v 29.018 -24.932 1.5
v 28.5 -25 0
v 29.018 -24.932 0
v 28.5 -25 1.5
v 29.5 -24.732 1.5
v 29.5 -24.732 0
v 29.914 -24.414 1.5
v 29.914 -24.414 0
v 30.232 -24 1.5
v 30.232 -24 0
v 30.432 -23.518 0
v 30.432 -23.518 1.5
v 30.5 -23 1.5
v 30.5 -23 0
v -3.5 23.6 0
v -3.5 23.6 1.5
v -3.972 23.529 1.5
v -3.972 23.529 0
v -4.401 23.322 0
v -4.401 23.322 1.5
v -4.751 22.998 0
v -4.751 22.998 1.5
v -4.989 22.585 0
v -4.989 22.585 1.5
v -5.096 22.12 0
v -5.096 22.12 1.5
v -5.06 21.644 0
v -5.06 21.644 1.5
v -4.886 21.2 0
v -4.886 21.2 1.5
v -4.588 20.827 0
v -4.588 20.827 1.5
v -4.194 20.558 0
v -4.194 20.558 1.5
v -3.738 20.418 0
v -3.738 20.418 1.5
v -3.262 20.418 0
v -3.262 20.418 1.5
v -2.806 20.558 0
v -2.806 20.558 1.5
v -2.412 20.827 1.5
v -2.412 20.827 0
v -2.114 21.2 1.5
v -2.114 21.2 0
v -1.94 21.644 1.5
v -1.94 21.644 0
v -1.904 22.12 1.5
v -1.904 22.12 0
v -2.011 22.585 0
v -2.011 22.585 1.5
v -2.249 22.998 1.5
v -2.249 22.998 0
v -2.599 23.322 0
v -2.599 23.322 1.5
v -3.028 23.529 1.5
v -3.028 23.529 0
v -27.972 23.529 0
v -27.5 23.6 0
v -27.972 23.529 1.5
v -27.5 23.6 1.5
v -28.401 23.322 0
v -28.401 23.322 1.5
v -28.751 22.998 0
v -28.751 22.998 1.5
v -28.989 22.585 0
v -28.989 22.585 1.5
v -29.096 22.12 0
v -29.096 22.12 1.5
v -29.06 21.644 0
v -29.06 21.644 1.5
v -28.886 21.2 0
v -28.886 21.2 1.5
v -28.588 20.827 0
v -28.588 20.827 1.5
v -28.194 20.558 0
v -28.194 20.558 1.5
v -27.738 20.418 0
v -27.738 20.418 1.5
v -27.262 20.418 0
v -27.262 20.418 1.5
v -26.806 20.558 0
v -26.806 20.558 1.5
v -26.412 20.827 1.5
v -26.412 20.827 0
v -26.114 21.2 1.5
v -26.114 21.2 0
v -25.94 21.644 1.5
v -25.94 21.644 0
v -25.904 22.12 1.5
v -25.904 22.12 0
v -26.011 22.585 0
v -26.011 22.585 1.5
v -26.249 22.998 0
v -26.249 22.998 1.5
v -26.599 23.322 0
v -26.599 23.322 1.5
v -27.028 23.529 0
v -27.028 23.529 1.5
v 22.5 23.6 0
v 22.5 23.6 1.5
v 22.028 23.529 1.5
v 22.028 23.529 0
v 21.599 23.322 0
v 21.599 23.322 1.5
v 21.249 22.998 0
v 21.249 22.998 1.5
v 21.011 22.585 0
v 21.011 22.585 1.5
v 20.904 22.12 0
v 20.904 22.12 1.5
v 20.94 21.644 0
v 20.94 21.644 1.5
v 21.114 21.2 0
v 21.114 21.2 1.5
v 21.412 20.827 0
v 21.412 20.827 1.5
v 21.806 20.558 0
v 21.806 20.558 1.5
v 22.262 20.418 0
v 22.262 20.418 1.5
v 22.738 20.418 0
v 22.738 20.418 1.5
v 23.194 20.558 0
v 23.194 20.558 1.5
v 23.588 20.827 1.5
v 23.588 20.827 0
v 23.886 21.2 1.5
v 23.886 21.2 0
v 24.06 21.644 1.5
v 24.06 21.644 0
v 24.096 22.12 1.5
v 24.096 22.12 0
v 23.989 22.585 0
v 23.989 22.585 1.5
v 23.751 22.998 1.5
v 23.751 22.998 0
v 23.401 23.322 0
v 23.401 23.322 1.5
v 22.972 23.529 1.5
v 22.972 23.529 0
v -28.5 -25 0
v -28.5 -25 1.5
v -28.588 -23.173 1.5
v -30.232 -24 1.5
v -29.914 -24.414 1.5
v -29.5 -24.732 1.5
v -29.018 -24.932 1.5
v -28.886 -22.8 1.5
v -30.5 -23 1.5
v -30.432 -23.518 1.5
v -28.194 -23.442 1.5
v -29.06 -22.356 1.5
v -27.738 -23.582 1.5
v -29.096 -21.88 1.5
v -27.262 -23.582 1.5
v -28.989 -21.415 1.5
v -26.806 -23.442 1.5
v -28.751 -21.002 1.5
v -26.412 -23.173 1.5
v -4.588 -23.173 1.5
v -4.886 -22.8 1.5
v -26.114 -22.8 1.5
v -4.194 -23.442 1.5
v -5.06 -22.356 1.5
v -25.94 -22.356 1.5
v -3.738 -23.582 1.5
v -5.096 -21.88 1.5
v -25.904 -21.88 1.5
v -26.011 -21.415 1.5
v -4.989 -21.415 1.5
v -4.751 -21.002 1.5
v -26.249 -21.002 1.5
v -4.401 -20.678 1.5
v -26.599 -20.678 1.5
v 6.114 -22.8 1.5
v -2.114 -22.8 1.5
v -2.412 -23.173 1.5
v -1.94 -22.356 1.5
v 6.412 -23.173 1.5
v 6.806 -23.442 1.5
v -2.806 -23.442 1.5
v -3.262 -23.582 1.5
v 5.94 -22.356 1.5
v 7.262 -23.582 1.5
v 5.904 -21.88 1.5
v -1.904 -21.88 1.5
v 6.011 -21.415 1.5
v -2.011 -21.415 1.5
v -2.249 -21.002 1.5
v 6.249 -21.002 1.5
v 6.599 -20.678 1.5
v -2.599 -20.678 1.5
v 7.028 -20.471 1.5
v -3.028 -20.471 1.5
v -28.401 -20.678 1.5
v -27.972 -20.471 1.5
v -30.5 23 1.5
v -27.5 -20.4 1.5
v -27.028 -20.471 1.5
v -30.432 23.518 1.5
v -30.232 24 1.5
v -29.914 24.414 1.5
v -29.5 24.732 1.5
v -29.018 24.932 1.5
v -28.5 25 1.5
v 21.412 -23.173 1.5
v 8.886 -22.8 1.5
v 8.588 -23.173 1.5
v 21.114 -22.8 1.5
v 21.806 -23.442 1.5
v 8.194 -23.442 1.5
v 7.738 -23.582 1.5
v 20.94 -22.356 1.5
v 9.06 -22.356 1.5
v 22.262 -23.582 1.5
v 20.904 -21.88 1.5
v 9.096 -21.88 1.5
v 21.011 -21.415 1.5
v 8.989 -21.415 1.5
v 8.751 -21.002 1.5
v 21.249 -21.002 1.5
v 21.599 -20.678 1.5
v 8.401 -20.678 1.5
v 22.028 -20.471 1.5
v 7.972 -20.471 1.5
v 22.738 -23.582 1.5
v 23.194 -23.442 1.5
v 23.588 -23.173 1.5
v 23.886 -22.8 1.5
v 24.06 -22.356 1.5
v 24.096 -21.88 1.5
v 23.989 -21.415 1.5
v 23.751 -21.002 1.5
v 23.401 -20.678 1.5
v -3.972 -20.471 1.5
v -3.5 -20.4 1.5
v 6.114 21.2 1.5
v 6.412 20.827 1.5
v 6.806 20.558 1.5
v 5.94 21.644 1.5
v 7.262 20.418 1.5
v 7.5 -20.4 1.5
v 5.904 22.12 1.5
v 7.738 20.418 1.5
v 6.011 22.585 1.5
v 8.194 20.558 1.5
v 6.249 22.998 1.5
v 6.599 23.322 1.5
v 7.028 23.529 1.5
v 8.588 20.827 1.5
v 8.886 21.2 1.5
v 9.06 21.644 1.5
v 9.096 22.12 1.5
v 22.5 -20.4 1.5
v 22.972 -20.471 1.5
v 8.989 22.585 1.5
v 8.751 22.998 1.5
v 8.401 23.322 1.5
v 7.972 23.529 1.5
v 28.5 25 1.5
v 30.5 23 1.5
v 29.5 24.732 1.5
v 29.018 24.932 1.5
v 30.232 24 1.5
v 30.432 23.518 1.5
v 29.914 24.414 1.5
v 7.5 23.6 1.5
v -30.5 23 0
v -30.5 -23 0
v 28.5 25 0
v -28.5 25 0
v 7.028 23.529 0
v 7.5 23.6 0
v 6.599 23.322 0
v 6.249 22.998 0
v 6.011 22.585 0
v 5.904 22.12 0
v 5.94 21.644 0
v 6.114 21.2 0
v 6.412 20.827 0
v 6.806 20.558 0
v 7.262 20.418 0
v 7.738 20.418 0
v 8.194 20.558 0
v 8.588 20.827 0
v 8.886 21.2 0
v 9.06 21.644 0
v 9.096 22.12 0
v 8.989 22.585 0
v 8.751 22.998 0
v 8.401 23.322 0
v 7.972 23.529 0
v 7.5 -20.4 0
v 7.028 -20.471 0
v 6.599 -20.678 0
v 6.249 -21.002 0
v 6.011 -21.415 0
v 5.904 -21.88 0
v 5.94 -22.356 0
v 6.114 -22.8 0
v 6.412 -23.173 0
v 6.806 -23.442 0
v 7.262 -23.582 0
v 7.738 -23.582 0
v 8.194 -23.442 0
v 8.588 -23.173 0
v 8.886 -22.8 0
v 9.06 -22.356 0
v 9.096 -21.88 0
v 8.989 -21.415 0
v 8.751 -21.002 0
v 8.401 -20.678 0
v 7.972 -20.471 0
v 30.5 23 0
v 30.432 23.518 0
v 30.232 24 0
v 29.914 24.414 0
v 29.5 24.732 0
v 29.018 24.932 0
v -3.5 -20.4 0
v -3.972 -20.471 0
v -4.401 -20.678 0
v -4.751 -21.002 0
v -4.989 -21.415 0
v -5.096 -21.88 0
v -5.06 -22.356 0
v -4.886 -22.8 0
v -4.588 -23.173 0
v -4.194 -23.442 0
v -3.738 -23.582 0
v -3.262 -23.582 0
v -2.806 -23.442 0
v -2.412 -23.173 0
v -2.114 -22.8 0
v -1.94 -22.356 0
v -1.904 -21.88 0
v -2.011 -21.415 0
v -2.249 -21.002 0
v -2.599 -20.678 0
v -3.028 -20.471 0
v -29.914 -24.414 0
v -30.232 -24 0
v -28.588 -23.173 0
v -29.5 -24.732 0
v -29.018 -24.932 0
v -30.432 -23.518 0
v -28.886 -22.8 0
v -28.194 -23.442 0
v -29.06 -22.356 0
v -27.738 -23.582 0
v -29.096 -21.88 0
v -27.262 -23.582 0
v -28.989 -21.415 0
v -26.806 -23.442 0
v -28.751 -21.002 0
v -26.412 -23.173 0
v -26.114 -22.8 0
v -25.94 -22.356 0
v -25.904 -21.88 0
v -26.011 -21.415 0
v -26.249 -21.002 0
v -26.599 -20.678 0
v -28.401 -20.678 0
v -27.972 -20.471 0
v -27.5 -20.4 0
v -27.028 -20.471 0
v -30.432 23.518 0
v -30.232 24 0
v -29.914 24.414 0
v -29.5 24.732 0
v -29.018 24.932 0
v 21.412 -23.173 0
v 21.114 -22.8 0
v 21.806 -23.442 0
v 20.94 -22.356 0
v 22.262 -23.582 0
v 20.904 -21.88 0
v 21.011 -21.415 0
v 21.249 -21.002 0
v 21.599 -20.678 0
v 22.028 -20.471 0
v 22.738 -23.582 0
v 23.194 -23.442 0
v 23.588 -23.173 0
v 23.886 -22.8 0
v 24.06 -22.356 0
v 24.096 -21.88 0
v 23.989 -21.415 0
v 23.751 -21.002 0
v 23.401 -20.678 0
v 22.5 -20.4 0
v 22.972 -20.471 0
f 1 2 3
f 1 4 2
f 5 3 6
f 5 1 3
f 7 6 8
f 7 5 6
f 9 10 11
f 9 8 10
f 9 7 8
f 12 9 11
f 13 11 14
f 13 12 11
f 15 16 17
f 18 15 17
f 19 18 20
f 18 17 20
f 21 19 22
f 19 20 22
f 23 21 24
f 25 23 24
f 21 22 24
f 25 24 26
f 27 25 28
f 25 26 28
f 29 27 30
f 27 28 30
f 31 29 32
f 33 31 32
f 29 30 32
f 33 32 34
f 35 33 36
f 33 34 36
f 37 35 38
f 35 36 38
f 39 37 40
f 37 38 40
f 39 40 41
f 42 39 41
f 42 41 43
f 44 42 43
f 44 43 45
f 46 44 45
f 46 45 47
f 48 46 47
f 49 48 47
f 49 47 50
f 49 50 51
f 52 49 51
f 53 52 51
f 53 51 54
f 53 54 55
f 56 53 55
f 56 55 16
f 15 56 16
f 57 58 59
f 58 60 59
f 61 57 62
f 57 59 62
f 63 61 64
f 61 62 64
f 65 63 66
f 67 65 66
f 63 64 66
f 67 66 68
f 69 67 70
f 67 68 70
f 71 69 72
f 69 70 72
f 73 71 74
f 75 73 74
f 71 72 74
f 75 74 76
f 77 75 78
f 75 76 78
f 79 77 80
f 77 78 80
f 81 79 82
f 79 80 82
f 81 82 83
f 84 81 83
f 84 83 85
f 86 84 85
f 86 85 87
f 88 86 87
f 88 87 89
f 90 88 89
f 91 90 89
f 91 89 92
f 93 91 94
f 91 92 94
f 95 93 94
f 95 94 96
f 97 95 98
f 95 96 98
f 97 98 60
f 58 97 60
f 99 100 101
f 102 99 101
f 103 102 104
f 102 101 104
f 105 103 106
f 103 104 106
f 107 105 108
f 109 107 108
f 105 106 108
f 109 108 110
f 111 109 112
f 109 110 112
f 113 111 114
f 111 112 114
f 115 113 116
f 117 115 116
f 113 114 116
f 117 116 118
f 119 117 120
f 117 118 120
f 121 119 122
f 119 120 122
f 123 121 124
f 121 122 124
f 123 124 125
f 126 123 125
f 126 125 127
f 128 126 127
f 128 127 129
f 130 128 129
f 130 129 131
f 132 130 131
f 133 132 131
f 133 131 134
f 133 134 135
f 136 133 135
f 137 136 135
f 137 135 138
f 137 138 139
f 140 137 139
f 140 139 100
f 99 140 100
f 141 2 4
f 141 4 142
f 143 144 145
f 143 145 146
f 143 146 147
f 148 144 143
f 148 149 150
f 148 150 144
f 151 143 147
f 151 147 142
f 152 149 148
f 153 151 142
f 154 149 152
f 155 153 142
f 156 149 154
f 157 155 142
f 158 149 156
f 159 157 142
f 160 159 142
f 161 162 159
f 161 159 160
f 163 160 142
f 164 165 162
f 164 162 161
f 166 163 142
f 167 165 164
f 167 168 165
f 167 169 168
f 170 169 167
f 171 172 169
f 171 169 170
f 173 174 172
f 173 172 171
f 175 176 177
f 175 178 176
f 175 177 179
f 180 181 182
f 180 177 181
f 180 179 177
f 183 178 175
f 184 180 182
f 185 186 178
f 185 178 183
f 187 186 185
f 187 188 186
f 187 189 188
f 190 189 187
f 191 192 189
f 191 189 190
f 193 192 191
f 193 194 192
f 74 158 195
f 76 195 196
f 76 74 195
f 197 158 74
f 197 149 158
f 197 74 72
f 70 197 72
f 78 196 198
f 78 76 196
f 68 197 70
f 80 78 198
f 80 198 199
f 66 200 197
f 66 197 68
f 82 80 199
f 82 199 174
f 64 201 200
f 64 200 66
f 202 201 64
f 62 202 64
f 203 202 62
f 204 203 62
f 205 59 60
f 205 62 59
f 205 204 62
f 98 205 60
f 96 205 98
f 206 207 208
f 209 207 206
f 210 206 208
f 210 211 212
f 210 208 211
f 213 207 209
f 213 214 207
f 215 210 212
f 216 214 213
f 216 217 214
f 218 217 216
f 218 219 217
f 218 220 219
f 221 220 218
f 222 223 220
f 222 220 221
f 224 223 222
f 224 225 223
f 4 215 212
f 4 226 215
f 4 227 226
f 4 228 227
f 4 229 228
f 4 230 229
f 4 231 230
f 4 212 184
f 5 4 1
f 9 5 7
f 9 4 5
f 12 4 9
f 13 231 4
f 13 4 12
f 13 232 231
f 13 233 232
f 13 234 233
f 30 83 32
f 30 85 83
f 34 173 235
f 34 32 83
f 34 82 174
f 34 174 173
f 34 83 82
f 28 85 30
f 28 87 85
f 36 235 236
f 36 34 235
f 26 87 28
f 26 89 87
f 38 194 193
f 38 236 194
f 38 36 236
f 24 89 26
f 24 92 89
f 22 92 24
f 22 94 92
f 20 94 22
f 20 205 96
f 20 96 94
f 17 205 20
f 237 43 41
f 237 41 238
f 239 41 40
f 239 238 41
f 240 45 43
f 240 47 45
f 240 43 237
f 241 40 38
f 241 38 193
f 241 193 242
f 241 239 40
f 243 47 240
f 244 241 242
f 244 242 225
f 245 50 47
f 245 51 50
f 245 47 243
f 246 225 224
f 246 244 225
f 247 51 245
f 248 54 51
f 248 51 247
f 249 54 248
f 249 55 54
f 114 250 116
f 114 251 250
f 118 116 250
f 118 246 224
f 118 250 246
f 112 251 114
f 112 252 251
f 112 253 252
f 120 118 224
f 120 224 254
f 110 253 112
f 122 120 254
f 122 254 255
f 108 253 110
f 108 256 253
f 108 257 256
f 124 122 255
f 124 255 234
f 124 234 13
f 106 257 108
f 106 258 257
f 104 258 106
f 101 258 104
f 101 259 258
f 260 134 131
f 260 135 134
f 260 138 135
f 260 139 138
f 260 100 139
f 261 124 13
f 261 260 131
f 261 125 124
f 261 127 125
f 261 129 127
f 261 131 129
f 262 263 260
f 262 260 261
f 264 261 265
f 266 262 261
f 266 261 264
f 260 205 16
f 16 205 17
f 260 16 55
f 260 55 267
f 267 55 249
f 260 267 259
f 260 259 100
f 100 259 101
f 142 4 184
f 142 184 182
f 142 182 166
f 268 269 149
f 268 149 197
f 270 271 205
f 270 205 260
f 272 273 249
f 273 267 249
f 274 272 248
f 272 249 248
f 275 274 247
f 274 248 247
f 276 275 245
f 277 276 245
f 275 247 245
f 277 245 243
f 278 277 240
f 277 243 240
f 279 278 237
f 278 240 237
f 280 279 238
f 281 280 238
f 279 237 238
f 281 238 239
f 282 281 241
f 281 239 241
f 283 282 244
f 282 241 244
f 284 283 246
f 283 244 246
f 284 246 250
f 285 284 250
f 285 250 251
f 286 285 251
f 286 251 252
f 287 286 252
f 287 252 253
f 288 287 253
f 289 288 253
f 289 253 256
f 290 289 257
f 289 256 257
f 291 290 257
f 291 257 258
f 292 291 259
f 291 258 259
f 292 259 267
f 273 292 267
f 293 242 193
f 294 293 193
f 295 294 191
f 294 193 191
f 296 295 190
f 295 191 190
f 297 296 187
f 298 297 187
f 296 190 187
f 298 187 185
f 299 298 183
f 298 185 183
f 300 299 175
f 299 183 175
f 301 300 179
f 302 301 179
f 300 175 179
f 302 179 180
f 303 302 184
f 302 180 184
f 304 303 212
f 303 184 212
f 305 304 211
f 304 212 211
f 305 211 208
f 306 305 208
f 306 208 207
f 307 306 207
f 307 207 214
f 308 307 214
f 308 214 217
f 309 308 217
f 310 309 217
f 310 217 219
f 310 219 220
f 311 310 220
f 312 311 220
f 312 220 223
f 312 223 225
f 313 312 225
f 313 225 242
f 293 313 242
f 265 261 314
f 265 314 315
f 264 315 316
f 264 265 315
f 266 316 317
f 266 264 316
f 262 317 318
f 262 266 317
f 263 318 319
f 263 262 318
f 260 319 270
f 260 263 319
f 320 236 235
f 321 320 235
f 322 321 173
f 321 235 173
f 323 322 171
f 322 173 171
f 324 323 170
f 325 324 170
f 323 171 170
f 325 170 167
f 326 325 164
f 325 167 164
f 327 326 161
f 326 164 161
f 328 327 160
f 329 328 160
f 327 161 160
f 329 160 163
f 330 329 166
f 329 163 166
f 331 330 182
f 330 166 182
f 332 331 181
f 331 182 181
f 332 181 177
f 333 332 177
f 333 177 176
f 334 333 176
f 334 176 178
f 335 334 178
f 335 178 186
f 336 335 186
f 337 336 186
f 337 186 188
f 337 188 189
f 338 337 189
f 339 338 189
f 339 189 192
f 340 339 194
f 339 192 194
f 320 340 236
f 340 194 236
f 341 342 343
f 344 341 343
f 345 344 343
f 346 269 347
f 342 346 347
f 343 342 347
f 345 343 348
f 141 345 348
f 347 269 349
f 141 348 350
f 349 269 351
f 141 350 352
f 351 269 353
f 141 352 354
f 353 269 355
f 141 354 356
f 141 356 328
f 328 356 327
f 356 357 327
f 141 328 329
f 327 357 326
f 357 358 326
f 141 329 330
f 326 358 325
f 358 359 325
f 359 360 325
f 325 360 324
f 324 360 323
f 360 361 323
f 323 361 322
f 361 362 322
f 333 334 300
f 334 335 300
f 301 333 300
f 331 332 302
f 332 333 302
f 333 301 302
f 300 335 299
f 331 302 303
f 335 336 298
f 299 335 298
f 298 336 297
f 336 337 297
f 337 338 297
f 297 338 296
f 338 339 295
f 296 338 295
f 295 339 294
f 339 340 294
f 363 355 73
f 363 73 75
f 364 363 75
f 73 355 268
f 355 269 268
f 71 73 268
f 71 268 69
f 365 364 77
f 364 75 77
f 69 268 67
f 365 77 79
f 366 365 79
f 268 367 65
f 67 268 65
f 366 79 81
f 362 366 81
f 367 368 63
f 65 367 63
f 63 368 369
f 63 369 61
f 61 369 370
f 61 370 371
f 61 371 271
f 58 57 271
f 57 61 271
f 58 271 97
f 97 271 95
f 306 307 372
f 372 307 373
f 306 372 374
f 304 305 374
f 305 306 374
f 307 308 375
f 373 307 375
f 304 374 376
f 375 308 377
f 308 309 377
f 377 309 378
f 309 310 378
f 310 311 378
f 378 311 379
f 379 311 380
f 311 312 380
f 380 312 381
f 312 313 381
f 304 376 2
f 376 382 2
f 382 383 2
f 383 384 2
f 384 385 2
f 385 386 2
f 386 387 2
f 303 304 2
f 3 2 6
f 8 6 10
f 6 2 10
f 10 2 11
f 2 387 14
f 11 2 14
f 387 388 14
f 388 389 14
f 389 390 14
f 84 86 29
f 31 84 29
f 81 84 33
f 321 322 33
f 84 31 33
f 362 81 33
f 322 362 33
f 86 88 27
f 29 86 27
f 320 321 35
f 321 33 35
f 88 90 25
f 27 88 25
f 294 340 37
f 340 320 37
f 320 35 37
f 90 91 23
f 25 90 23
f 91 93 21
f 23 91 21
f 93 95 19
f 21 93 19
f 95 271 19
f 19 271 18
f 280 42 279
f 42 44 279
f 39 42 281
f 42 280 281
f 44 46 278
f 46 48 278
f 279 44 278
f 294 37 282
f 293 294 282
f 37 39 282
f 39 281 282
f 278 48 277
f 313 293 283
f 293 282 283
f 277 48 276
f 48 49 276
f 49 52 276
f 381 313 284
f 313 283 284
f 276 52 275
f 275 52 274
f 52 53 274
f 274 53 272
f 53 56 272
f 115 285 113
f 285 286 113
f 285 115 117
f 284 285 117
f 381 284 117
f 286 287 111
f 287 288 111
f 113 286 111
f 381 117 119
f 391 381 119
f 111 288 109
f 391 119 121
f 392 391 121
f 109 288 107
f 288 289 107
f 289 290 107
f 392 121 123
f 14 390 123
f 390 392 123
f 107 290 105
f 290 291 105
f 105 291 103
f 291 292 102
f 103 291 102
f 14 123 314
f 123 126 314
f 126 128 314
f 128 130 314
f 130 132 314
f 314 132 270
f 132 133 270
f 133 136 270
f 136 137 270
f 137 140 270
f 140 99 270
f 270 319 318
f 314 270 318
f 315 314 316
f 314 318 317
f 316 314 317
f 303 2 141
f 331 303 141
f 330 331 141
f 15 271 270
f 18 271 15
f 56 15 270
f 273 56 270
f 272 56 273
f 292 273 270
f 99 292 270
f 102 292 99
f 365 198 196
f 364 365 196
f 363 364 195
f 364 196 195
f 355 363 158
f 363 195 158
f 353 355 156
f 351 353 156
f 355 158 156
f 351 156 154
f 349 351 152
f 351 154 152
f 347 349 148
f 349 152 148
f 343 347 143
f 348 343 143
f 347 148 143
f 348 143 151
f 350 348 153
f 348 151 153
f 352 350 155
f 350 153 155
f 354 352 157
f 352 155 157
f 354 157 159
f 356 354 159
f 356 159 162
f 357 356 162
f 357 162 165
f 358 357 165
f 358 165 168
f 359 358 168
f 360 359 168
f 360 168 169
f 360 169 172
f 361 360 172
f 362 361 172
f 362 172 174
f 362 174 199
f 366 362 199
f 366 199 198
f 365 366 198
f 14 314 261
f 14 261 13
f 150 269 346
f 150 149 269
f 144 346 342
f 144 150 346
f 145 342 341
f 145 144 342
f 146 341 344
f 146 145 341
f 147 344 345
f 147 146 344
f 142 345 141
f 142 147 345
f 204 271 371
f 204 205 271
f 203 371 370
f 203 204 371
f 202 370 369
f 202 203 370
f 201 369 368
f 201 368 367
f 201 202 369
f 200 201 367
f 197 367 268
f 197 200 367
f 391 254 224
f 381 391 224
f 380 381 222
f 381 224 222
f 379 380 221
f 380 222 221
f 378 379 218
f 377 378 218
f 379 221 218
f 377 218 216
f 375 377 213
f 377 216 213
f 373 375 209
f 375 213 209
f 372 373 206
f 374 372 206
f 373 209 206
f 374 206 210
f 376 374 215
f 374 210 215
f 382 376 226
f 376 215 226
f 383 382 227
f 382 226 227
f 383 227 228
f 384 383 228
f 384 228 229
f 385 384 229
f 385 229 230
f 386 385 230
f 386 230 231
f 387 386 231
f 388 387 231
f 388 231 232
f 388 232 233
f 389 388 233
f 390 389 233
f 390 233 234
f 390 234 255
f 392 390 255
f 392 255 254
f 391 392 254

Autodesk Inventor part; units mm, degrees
ref_plane "YZ Plane" through (0, 0, 0) normal (1, 0, 0) x (0, 1, 0)
ref_plane "XZ Plane" through (0, 0, 0) normal (0, 1, 0) x (-1, 0, 0)
ref_plane "XY Plane" through (0, 0, 0) normal (0, 0, 1) x (1, 0, 0)
sketch "スケッチ1" plane through (0, 0, 0) normal (0, 0, 1) x (1, 0, 0)
  line L0 (-30.5, 25) -> (30.5, 25)
  line L1 (30.5, 25) -> (30.5, -25)
  line L2 (30.5, -25) -> (-30.5, -25)
  line L3 (-30.5, -25) -> (-30.5, 25)
  point P0 (0, 0)
  point P1 (-30.5, 0)
  point P2 (0, 25)
  point P3 (-27.5, 22)
  point P4 (7.5, 22)
  point P5 (7.5, -22)
  point P6 (-27.5, -22)
  point P7 (-3.5, -22)
  point P8 (-3.5, 22)
  point P9 (22.5, 22)
  point P10 (22.5, -22)
  dimension "d0" = 50
  dimension "d1" = 61
  dimension "d2" = 35
  dimension "d3" = 44
  dimension "d4" = 3
  dimension "d5" = 3
  dimension "d18" = 44
  dimension "d20" = 22
  dimension "d23" = 26
  dimension "d26" = 11
extrude "押し出し1" add sketch "スケッチ1" along normal blind 1.5
hole "穴1" at (-27.5, 22, 0) at (7.5, 22, 0) at (7.5, -22, 0) at (-27.5, -22, 0) at (-3.5, -22, 0) at (-3.5, 22, 0) at (22.5, 22, 0) at (22.5, -22, 0) direction (0, 0, 1) diameter 3.2 depth 8.8 tip angle 118
fillet "フィレット1" radius 2 4 edges at (30.5, 25, 0.75) (30.5, -25, 0.75) (-30.5, 25, 0.75) (-30.5, -25, 0.75)
equation "\"d20\" = 0.5 * d18"
properties part number "回収機構天井"
